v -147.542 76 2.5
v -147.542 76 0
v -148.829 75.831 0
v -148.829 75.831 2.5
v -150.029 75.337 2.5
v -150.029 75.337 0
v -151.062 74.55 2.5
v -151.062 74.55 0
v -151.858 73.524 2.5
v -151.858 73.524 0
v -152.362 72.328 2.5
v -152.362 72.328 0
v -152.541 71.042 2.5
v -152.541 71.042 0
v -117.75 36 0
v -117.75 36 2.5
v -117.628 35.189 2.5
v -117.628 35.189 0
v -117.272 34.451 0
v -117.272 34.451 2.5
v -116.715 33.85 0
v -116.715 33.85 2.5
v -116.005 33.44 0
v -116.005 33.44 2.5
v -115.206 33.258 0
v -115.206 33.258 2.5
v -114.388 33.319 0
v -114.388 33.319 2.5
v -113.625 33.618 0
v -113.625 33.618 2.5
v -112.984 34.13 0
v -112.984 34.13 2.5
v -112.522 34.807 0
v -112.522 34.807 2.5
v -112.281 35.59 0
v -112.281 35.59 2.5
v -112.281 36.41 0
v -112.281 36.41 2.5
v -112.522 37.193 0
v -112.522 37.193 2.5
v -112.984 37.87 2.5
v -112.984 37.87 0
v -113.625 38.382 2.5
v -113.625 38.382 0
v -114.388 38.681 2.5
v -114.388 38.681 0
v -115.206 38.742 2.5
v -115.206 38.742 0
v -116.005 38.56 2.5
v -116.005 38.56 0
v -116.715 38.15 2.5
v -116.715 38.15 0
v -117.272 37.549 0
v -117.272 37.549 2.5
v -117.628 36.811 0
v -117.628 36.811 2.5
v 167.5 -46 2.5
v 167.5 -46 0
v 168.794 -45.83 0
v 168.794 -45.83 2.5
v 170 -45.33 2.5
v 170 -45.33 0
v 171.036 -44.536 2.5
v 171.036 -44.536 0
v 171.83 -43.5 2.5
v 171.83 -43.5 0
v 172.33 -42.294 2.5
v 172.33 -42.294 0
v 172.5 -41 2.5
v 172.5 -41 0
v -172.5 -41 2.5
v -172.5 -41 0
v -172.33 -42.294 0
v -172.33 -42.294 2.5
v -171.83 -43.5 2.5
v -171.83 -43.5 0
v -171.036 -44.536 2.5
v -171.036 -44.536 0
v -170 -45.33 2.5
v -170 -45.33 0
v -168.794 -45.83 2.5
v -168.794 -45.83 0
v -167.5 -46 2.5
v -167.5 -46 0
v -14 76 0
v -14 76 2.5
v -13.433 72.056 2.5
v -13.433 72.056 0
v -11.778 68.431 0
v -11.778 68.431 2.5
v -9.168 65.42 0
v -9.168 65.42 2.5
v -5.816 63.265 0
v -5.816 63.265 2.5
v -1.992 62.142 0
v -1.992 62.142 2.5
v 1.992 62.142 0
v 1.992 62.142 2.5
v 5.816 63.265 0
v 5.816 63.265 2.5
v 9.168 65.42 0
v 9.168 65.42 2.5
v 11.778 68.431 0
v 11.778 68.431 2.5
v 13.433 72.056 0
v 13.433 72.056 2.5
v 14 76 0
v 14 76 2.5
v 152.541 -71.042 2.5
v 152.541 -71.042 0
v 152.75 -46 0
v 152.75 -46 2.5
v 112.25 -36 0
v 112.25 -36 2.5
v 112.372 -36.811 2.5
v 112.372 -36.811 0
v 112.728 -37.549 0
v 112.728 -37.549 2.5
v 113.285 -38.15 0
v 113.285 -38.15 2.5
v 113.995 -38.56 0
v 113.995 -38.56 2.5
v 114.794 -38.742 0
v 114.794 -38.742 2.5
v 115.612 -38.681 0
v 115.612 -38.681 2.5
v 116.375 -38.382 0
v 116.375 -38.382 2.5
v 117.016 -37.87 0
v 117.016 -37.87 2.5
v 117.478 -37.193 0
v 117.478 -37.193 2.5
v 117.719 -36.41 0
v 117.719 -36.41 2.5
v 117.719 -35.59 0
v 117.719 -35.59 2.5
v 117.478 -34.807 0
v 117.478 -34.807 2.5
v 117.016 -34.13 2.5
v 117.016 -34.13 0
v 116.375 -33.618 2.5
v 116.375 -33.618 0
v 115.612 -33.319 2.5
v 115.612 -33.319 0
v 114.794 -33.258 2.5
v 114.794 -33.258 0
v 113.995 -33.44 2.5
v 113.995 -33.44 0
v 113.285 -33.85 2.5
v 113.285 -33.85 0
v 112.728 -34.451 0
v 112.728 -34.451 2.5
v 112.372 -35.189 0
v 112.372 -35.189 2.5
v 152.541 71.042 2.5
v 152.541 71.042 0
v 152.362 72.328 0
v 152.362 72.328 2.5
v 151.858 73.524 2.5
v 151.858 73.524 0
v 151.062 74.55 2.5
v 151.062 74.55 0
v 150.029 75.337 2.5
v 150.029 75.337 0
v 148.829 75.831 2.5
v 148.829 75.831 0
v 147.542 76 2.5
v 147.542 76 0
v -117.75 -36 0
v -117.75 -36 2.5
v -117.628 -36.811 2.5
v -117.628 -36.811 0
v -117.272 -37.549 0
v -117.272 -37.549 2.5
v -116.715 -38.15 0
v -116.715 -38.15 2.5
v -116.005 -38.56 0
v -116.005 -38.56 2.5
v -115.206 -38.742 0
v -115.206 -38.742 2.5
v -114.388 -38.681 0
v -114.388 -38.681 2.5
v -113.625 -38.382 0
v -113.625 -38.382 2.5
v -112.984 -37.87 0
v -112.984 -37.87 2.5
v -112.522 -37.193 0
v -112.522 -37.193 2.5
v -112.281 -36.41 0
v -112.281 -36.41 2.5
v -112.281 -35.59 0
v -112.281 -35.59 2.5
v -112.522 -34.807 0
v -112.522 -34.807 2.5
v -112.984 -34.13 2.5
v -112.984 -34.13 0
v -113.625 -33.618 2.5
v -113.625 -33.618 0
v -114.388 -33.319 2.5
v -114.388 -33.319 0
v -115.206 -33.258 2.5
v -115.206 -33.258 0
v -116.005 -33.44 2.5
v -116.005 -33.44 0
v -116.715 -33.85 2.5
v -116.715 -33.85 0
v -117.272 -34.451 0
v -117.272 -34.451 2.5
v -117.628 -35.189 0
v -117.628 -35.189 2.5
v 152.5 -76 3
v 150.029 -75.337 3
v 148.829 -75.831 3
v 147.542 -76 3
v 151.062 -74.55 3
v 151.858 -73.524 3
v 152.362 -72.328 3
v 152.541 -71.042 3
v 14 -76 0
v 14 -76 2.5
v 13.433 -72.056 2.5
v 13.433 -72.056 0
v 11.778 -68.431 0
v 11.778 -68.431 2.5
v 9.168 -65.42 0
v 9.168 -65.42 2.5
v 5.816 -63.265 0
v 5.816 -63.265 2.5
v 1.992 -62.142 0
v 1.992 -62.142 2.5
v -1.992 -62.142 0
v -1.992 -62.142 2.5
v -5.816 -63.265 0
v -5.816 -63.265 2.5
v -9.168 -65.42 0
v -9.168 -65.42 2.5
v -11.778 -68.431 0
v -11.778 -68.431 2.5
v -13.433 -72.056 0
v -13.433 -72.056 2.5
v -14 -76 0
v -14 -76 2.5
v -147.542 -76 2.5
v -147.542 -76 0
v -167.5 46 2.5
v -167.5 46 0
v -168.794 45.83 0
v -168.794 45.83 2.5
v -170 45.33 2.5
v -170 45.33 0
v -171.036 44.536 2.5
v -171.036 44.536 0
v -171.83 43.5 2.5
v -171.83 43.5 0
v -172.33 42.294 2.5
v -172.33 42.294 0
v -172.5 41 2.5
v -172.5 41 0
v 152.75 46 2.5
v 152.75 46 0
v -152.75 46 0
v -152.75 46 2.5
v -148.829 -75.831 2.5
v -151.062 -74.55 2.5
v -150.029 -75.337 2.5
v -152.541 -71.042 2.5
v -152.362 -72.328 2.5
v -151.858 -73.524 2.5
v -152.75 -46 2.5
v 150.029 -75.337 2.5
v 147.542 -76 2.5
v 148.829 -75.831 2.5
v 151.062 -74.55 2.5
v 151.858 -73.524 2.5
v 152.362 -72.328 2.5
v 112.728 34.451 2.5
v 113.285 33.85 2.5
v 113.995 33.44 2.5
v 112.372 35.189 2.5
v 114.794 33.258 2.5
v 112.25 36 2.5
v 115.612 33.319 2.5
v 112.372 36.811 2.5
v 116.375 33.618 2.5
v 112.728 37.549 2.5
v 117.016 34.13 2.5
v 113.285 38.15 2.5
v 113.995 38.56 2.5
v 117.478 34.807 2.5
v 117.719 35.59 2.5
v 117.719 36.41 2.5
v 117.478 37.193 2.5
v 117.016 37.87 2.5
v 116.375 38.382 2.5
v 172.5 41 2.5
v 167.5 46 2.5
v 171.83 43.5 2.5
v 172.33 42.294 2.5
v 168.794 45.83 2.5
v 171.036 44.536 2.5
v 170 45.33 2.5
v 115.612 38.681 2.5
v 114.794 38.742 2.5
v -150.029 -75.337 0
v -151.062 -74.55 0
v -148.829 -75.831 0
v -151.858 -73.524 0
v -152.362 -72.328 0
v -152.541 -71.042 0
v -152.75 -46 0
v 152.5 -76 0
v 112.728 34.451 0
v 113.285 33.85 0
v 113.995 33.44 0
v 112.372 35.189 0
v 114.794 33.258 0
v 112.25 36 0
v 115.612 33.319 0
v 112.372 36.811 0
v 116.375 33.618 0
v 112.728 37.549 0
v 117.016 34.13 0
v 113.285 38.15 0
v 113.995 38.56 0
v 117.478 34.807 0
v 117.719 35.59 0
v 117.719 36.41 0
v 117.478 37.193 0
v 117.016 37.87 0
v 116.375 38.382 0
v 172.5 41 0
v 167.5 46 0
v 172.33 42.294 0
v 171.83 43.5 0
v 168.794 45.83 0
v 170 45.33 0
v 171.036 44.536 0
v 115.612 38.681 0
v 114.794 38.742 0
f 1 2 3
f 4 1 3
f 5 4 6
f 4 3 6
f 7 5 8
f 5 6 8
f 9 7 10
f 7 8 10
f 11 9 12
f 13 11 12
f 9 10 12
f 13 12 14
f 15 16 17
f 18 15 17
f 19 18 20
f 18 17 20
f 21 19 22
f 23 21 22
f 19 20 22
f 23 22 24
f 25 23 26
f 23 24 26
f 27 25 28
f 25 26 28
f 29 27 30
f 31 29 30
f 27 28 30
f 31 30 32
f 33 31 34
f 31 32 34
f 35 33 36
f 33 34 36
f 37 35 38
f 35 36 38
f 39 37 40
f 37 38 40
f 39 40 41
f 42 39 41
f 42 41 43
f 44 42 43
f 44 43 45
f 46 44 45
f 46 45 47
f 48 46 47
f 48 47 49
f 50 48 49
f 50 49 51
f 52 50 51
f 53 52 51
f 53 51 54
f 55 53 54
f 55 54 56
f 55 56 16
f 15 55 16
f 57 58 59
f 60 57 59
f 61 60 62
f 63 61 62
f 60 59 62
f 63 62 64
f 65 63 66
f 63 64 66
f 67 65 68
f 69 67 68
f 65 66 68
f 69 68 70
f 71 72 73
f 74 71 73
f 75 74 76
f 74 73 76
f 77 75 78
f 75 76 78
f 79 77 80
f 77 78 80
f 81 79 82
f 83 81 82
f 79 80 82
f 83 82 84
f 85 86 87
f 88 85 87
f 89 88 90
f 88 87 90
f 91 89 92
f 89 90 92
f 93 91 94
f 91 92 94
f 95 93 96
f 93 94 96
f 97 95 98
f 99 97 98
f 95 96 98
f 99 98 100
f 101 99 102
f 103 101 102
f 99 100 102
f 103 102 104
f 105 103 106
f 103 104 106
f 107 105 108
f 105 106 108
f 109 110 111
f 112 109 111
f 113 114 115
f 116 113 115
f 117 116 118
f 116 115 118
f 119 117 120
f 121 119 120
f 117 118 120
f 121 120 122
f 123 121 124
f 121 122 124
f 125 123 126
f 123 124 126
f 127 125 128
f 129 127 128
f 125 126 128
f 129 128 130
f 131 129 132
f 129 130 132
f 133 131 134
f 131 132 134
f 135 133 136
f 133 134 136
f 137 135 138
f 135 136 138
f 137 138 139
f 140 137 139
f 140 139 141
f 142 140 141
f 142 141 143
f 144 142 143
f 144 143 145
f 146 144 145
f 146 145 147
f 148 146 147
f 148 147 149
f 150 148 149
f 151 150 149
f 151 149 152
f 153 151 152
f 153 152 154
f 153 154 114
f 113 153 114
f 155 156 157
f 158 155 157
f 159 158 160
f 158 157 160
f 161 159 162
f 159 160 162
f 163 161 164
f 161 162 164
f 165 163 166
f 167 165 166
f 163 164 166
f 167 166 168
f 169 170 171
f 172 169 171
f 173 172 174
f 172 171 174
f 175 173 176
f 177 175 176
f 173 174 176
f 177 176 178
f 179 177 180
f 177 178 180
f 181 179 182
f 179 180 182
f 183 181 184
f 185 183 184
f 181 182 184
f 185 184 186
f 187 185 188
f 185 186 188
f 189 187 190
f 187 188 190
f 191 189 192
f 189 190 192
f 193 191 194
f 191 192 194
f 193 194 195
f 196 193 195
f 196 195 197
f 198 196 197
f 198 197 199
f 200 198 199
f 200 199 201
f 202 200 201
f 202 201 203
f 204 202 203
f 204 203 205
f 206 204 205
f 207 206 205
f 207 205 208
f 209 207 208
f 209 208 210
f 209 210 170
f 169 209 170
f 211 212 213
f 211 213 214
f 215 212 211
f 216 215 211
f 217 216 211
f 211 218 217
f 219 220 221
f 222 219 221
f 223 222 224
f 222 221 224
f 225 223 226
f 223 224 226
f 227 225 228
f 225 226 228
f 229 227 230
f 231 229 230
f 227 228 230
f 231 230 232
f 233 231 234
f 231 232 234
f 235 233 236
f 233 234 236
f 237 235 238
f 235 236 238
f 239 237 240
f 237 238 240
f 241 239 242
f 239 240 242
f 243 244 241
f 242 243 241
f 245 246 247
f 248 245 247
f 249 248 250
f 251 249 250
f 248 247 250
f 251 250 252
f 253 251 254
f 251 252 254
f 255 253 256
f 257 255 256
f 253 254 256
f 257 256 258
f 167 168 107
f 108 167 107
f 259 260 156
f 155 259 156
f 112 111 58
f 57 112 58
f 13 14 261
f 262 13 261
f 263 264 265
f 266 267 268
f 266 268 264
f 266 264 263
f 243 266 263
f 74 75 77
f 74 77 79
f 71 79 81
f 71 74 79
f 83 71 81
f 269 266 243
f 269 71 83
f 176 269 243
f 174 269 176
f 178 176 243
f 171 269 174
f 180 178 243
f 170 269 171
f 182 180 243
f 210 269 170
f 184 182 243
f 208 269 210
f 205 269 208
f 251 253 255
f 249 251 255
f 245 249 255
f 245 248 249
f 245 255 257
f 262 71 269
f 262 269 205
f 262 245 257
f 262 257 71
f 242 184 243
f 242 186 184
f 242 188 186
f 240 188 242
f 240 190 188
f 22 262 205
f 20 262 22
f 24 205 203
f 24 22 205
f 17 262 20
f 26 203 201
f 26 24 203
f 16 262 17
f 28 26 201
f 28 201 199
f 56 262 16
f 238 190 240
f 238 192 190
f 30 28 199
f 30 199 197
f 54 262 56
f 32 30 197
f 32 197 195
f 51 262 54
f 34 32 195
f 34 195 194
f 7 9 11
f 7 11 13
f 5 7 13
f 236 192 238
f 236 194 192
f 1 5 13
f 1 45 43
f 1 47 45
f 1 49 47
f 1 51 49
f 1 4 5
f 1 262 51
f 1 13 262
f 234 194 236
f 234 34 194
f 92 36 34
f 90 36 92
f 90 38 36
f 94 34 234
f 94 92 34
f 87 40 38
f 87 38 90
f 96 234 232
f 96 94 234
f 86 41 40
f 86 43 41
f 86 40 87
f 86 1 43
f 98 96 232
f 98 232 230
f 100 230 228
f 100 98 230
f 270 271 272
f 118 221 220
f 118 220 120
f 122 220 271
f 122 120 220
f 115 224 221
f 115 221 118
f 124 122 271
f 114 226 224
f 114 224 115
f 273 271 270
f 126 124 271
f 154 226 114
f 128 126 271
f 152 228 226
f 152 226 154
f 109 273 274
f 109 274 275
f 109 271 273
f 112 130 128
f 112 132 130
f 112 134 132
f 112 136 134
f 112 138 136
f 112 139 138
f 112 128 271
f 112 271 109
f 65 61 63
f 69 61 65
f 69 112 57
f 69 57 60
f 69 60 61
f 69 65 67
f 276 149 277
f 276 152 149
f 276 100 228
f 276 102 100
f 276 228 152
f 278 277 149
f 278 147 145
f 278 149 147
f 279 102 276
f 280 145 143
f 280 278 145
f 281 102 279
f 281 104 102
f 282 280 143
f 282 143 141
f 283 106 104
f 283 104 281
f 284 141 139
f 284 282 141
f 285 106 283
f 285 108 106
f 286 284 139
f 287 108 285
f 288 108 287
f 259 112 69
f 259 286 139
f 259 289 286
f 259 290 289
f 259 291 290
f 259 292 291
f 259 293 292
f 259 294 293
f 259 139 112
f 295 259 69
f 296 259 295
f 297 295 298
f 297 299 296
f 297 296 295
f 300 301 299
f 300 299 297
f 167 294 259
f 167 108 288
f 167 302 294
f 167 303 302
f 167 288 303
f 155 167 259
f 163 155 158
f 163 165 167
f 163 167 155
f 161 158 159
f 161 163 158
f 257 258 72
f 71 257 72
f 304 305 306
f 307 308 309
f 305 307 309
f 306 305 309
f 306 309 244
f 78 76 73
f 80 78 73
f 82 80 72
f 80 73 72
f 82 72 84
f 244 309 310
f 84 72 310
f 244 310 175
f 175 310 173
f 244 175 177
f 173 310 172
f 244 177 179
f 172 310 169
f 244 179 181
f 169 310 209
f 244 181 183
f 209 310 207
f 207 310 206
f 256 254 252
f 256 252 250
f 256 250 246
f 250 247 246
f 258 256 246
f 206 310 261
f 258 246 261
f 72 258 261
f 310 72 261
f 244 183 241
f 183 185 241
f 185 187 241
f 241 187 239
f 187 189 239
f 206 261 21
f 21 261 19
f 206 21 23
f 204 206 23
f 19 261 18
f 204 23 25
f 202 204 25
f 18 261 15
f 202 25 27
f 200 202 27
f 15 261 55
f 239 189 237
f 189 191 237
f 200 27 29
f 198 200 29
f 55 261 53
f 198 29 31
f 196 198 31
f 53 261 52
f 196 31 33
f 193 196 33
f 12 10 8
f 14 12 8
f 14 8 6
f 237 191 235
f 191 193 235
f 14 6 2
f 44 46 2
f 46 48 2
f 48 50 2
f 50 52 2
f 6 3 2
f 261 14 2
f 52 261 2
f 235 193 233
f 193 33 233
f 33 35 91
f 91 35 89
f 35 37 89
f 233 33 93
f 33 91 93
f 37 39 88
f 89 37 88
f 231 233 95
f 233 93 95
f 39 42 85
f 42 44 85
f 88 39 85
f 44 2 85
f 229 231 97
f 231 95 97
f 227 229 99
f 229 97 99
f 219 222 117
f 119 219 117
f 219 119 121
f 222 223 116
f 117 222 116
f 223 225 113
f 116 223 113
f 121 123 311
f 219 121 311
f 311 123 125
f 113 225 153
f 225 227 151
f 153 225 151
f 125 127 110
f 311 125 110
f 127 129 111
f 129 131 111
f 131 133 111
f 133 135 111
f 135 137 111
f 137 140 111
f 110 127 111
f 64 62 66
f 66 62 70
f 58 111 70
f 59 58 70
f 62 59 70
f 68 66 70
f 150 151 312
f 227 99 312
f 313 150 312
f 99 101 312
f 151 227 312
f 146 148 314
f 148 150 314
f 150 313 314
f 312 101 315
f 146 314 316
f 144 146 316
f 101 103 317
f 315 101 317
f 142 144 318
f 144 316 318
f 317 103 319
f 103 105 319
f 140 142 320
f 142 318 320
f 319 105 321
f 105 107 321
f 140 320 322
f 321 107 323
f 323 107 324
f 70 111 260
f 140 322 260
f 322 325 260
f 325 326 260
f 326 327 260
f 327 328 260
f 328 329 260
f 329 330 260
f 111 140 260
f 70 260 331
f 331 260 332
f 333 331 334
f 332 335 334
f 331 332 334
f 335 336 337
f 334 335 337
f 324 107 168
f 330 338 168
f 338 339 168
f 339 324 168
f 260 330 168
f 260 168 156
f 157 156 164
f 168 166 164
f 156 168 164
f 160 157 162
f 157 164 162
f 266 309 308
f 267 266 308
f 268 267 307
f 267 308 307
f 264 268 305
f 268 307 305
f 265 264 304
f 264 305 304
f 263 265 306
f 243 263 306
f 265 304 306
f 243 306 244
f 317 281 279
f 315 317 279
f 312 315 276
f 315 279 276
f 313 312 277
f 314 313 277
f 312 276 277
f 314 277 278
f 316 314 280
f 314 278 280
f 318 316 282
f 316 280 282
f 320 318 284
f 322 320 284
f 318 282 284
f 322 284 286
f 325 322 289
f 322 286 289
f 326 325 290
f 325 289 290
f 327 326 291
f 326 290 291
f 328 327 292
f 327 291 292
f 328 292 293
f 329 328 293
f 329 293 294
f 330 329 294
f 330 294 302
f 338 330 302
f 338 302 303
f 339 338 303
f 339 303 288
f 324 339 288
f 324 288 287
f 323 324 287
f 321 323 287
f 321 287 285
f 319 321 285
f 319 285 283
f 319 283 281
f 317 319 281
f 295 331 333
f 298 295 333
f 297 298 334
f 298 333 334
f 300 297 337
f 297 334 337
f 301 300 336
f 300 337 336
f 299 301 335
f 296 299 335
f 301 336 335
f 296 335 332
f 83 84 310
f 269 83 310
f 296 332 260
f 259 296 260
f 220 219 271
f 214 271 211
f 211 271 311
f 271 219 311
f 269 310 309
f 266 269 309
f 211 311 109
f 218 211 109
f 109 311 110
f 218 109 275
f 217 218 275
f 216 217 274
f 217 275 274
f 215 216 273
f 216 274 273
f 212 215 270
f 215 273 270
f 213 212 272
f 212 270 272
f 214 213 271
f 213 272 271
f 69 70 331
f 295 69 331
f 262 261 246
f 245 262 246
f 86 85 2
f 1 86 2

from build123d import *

# Parameters (mm, degrees)
F1_DEPTH = 3
F2_DEPTH = 2.5
F3_D     = 28
F3_DEPTH = 50.5
F3_TIP   = 8.4120486664
F4_D     = 28
F4_DEPTH = 50.5
F4_TIP   = 8.4120486664
F5_D     = 5.5
F5_DEPTH = 14.4
F5_TIP   = 1.6523667023


with BuildPart() as f1:
    # F0 (on Top) → F1 (new body)
    with BuildSketch(Plane.XY):
        with BuildLine():
            ThreePointArc((152.5413805678, -71.0417273613), (151.062304835, -74.5502561039), (147.5415546881, -76))
            Line((147.5415546881, -76), (152.5, -76))
            Line((152.5, -76), (152.5413805678, -71.0417273613))
        make_face()
    extrude(amount=F1_DEPTH)

    # F0 (on Top) → F2 (join)
    with BuildSketch(Plane.XY):
        with BuildLine():
            ThreePointArc((-152.5413805678, -71.0417273613), (-151.062304835, -74.5502561039), (-147.5415546881, -76))
            Line((-147.5415546881, -76), (147.5415546881, -76))
            ThreePointArc((147.5415546881, -76), (151.062304835, -74.5502561039), (152.5413805678, -71.0417273613))
            Line((152.5413805678, -71.0417273613), (152.7503728867, -46))
            Line((152.7503728867, -46), (167.5, -46))
            ThreePointArc((167.5, -46), (171.0355339059, -44.5355339059), (172.5, -41))
            Line((172.5, -41), (172.5, 41))
            ThreePointArc((172.5, 41), (171.0355339059, 44.5355339059), (167.5, 46))
            Line((167.5, 46), (152.7503728867, 46))
            Line((152.7503728867, 46), (152.5413805678, 71.0417273613))
            ThreePointArc((152.5413805678, 71.0417273613), (151.062304835, 74.5502561039), (147.5415546881, 76))
            Line((147.5415546881, 76), (-147.5415546881, 76))
            ThreePointArc((-147.5415546881, 76), (-151.062304835, 74.5502561039), (-152.5413805678, 71.0417273613))
            Line((-152.5413805678, 71.0417273613), (-152.7503728867, 46))
            Line((-152.7503728867, 46), (-167.5, 46))
            ThreePointArc((-167.5, 46), (-171.0355339059, 44.5355339059), (-172.5, 41))
            Line((-172.5, 41), (-172.5, -41))
            ThreePointArc((-172.5, -41), (-171.0355339059, -44.5355339059), (-167.5, -46))
            Line((-167.5, -46), (-152.7503728867, -46))
            Line((-152.7503728867, -46), (-152.5413805678, -71.0417273613))
        make_face()
    extrude(amount=F2_DEPTH)

    # F3
    with Locations(Plane(origin=(0, 0, 0), x_dir=(1, 0, 0), z_dir=(0, 0, -1))):
        with Locations((0, -76)):
            Hole(F3_D / 2, depth=F3_DEPTH)
            with Locations((0, 0, -(F3_DEPTH + F3_TIP / 2))):  # 118° drill point
                Cone(0, F3_D / 2, F3_TIP, mode=Mode.SUBTRACT)

    # F4
    with Locations(Plane(origin=(0, 0, 0), x_dir=(1, 0, 0), z_dir=(0, 0, -1))):
        with Locations((0, 76)):
            Hole(F4_D / 2, depth=F4_DEPTH)
            with Locations((0, 0, -(F4_DEPTH + F4_TIP / 2))):  # 118° drill point
                Cone(0, F4_D / 2, F4_TIP, mode=Mode.SUBTRACT)

    # F5
    with Locations(Plane(origin=(0, 0, 0), x_dir=(1, 0, 0), z_dir=(0, 0, -1))):
        with Locations((-115, 36), (-115, -36), (115, -36), (115, 36)):
            Hole(F5_D / 2, depth=F5_DEPTH)
            with Locations((0, 0, -(F5_DEPTH + F5_TIP / 2))):  # 118° drill point
                Cone(0, F5_D / 2, F5_TIP, mode=Mode.SUBTRACT)


solid = f1.part
